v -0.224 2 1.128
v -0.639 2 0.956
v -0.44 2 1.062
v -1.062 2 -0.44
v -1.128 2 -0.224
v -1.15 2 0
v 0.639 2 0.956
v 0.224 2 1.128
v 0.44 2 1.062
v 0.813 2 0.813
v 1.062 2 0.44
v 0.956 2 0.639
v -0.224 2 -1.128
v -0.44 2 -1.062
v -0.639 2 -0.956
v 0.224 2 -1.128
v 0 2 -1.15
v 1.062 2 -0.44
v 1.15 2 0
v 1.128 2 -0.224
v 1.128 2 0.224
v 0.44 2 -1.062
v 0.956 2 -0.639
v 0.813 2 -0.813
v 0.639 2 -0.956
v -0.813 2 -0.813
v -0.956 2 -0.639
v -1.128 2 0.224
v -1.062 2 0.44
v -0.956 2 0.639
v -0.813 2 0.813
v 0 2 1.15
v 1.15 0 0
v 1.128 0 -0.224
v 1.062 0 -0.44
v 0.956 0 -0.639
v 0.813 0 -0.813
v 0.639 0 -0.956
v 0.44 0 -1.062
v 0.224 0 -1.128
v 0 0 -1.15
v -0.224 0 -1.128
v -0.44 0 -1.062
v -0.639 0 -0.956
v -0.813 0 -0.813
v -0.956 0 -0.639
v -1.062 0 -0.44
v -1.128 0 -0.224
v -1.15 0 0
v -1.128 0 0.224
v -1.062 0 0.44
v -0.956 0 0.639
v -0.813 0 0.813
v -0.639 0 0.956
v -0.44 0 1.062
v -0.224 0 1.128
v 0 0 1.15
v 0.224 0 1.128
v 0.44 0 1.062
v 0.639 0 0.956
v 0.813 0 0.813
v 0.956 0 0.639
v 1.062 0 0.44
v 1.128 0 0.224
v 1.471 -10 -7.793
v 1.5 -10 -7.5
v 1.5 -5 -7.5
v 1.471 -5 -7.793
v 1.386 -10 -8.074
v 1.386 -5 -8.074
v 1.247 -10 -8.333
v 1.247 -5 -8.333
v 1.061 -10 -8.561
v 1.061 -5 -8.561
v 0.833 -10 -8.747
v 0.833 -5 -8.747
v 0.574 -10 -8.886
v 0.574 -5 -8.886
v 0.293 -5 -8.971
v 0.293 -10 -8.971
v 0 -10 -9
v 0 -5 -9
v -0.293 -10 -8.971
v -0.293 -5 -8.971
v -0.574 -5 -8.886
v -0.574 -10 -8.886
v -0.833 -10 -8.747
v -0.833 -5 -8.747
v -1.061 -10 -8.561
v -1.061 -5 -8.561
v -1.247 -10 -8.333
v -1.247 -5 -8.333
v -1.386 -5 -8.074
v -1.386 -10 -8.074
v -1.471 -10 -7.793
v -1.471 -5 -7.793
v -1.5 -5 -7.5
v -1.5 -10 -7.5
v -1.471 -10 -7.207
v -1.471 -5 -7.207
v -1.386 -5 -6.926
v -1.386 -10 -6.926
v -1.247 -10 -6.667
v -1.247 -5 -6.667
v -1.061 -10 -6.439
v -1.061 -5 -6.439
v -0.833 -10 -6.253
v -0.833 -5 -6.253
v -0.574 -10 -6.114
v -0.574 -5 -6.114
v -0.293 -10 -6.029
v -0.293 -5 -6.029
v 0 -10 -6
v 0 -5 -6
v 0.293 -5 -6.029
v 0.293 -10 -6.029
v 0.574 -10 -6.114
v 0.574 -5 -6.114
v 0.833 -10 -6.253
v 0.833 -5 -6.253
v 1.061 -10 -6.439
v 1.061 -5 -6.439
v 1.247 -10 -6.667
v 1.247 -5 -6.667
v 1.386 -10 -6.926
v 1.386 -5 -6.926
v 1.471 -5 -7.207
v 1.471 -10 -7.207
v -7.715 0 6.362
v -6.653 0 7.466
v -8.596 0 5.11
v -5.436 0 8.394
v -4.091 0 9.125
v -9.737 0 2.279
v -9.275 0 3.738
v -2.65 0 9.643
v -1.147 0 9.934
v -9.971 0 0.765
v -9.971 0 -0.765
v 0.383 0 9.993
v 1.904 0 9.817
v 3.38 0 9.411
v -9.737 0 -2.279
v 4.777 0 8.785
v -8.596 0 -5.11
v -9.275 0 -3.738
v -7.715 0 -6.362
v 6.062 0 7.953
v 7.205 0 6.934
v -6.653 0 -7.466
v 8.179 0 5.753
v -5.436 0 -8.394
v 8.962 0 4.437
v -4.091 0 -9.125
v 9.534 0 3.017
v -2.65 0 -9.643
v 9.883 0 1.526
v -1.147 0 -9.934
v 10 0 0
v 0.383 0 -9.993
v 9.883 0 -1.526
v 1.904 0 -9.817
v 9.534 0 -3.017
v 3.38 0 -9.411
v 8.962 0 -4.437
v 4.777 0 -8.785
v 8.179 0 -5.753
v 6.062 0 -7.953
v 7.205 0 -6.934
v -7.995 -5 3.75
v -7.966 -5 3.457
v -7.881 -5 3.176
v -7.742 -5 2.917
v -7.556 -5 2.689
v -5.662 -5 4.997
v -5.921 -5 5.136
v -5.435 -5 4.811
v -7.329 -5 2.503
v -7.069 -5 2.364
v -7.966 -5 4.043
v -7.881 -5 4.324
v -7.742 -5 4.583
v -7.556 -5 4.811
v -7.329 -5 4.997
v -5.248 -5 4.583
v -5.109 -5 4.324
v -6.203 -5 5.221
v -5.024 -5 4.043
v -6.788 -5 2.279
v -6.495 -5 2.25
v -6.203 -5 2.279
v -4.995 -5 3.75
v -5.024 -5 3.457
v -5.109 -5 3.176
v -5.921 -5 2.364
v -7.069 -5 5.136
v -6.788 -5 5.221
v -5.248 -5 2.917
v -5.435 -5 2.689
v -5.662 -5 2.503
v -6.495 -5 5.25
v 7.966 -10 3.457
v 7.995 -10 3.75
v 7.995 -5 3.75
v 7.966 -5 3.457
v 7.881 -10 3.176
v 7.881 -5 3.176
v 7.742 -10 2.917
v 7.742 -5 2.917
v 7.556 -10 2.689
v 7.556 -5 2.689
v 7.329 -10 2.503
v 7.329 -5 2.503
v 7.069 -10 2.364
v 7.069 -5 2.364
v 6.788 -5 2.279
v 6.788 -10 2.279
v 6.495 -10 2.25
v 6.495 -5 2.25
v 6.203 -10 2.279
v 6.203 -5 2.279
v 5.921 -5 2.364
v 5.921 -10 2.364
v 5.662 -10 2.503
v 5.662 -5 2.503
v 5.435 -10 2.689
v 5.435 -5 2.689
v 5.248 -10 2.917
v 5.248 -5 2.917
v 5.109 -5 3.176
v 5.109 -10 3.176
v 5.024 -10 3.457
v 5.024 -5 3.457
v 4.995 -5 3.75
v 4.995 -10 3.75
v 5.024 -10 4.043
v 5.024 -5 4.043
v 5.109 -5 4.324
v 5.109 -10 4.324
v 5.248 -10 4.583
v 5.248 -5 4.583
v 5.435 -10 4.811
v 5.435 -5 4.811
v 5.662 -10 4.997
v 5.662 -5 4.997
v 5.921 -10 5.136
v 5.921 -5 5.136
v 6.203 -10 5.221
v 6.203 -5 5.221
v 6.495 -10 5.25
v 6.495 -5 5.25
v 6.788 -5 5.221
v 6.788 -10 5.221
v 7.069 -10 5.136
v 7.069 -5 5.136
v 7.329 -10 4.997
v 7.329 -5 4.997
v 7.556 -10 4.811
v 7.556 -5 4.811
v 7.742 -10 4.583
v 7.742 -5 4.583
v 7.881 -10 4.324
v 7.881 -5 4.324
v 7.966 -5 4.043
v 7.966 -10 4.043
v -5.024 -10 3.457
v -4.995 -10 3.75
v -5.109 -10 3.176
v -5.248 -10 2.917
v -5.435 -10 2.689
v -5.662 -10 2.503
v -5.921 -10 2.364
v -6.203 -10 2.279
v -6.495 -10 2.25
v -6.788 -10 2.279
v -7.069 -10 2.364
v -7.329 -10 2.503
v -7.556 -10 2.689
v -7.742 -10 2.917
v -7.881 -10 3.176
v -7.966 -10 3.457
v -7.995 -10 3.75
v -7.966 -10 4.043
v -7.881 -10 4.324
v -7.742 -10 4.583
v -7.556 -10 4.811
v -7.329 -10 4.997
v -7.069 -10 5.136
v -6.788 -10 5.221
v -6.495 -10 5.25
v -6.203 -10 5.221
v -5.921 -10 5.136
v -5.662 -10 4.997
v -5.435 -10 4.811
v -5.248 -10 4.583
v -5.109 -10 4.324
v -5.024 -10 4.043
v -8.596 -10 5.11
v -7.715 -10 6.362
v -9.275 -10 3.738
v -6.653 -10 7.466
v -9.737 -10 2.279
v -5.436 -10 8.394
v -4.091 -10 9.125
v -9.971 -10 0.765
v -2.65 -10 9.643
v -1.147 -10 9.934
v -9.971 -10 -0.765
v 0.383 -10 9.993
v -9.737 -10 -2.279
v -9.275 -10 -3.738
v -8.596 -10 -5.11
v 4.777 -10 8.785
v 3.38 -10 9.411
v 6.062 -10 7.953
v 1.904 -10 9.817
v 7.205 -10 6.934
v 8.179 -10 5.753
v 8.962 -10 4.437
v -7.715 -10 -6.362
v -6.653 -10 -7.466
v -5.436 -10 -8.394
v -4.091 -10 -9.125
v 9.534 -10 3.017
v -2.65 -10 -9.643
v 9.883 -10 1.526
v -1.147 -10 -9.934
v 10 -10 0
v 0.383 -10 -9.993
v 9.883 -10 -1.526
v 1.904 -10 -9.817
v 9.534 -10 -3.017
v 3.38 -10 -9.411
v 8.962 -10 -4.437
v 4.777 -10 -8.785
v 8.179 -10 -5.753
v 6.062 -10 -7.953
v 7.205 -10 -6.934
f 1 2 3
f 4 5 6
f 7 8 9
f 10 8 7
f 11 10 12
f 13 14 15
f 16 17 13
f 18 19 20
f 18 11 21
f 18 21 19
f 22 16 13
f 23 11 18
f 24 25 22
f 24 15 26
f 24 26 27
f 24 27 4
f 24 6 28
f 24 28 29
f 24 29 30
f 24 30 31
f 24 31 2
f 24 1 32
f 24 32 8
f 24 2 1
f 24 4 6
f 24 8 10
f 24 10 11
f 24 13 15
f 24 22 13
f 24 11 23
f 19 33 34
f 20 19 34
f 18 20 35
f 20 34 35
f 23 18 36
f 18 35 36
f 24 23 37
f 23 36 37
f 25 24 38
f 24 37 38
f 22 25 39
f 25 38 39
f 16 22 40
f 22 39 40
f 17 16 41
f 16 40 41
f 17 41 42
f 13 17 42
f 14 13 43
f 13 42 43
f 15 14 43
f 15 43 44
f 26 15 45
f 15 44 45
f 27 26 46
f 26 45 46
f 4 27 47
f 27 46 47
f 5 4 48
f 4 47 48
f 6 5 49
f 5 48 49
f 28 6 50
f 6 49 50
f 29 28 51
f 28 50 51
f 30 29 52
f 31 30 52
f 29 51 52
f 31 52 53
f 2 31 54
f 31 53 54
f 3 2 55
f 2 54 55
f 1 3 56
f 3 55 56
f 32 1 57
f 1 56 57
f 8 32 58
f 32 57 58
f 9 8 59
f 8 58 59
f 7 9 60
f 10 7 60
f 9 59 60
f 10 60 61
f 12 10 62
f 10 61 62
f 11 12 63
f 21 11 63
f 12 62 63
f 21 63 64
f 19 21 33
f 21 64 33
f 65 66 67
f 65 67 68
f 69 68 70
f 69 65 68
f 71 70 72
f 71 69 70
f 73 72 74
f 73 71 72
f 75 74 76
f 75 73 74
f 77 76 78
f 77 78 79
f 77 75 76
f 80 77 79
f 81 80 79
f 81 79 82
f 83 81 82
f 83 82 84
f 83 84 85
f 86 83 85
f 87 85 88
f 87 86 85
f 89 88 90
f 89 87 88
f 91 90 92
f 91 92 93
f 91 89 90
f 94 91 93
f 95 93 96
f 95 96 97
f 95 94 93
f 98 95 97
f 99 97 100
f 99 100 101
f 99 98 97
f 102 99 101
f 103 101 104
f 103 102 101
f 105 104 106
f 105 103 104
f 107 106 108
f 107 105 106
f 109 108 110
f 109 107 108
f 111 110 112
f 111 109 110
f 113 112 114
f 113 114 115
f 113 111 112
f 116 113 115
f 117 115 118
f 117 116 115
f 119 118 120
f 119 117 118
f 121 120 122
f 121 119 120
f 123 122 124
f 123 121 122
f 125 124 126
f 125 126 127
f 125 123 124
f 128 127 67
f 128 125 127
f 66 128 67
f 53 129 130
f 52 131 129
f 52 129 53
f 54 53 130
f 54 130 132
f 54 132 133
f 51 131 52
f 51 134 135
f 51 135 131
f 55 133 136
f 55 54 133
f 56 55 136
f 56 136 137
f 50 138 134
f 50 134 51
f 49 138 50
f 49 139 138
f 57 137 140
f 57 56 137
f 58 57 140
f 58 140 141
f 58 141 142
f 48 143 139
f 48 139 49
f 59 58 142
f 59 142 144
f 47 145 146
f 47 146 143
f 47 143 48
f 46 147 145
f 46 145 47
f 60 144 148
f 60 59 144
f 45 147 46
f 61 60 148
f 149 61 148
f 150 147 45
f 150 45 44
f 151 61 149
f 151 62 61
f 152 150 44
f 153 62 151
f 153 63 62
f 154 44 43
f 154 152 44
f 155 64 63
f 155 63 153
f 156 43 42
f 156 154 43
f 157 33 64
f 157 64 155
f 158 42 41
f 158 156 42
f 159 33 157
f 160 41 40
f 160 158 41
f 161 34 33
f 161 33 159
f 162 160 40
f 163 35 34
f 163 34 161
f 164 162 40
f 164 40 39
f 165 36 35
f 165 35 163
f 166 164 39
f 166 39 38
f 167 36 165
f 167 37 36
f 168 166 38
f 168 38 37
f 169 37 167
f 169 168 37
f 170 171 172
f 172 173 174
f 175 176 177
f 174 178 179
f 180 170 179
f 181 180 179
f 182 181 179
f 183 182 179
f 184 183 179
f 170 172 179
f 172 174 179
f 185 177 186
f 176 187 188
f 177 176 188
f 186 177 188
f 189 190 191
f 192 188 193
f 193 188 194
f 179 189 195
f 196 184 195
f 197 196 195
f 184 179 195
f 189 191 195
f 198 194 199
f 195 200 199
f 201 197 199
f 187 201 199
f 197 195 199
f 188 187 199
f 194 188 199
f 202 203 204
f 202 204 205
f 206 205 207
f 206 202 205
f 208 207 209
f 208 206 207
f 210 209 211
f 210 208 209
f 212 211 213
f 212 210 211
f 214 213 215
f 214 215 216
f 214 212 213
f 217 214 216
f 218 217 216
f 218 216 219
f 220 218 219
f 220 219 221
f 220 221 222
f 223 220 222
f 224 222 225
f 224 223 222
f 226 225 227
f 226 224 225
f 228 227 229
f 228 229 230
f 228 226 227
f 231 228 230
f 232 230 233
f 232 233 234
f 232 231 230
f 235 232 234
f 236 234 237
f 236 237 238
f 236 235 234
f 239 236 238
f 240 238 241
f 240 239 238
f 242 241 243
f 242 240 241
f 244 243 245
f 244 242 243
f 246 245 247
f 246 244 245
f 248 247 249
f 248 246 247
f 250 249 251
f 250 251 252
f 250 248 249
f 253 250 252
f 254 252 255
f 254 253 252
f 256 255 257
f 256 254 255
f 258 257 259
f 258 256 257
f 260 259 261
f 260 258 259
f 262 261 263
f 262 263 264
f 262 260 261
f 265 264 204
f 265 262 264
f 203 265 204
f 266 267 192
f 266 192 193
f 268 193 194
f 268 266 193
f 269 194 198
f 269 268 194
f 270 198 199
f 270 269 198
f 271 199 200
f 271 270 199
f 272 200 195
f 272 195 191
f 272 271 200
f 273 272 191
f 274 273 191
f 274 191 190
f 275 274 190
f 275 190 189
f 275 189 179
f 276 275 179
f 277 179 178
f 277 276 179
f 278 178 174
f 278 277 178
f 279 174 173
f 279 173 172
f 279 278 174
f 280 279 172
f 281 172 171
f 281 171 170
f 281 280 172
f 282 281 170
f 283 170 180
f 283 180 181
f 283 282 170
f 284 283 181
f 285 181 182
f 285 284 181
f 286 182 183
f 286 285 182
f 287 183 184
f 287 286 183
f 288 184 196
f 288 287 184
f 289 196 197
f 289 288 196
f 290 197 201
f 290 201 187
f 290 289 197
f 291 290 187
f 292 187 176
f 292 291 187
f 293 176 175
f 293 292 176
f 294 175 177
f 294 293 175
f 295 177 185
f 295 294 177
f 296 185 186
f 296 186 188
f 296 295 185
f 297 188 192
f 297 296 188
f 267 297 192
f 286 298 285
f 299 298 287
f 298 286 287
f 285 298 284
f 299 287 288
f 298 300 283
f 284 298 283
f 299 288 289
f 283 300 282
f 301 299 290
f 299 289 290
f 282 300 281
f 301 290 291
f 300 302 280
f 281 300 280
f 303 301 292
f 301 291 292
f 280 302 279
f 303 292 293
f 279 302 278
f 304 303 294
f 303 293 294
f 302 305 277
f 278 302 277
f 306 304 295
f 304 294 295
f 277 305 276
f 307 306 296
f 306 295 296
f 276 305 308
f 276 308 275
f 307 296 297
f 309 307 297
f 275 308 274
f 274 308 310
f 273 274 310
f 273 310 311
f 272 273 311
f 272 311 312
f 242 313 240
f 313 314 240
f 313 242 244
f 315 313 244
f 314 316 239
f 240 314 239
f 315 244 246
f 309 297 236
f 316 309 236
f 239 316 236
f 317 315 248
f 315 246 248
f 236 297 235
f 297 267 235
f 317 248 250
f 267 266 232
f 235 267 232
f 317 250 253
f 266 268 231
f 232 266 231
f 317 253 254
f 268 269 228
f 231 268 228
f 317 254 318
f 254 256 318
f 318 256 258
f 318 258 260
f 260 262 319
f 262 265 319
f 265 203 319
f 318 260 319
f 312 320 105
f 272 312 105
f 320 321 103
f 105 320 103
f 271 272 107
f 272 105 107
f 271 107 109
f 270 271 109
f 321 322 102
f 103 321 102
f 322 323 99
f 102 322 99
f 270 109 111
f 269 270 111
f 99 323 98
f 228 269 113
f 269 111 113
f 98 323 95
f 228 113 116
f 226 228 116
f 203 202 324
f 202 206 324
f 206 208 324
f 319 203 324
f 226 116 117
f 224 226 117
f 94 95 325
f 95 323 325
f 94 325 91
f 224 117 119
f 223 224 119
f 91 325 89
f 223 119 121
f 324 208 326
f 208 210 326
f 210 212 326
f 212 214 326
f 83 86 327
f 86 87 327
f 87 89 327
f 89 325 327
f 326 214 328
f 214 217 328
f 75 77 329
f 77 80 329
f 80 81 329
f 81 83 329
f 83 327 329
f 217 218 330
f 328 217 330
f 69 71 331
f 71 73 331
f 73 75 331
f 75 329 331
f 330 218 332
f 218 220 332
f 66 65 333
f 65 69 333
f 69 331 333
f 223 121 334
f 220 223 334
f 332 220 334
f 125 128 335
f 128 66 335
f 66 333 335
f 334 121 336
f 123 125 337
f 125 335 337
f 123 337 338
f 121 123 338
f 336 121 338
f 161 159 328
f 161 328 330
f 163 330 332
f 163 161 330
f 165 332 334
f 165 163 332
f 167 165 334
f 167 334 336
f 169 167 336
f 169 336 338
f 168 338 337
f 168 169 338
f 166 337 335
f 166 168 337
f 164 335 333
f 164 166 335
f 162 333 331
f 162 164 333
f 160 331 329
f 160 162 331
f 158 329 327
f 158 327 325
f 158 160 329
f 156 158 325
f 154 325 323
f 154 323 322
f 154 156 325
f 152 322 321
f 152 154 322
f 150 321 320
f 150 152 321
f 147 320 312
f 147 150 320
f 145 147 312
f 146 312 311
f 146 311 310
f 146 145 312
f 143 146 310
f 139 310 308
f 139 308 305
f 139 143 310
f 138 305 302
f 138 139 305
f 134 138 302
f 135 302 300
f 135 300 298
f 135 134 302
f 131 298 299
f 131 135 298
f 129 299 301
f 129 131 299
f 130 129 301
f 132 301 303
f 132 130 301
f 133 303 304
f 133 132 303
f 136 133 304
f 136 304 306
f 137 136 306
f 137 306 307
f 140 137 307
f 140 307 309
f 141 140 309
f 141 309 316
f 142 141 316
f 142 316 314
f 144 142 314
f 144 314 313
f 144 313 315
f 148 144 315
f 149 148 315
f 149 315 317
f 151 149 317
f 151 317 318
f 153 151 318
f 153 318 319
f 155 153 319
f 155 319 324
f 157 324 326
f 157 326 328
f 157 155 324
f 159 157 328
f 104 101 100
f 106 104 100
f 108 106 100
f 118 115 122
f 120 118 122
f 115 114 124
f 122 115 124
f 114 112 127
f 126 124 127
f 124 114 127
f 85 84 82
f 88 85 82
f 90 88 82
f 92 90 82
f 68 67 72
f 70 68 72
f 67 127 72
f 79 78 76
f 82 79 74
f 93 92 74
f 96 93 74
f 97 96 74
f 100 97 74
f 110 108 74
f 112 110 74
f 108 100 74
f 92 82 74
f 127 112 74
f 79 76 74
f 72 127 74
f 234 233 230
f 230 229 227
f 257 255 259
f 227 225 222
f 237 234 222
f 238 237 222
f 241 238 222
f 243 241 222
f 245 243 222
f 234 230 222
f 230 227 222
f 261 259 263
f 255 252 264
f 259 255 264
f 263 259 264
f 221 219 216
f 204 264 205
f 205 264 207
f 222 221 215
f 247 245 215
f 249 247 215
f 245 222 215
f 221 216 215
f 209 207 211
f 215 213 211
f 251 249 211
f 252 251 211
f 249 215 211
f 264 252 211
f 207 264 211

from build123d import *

# Parameters (mm, degrees)
SKETCH1_R           = 10
BOSS_EXTRUDE1_DEPTH = 10
SKETCH1_3_R         = 1.15
BOSS_EXTRUDE2_DEPTH = 2
CUT_EXTRUDE1_START  = -10
SKETCH1_4_R         = 1.5
CUT_EXTRUDE1_DEPTH  = 5


with BuildPart() as part:
    # Sketch1 → Boss-Extrude1 (new body)
    with BuildSketch(Plane(origin=(0, 0, 0), x_dir=(1, 0, 0), z_dir=(0, 1, 0))):
        Circle(SKETCH1_R)
    extrude(amount=-BOSS_EXTRUDE1_DEPTH)

    # Sketch1<3> → Boss-Extrude2 (add)
    with BuildSketch(Plane(origin=(0, 0, 0), x_dir=(1, 0, 0), z_dir=(0, 1, 0))):
        Circle(SKETCH1_3_R)
    extrude(amount=BOSS_EXTRUDE2_DEPTH)

    # Sketch1<4> → Cut-Extrude1 (cut)
    with BuildSketch(Plane(origin=(0, 0, 0), x_dir=(1, 0, 0), z_dir=(0, 1, 0)).offset(CUT_EXTRUDE1_START)):
        with Locations((6.495190528, -3.75)):
            Circle(SKETCH1_4_R)
        with Locations((-6.495190528, -3.75)):
            Circle(SKETCH1_4_R)
        with Locations((0, 7.5)):
            Circle(SKETCH1_4_R)
    extrude(amount=CUT_EXTRUDE1_DEPTH, mode=Mode.SUBTRACT)


solid = part.part
